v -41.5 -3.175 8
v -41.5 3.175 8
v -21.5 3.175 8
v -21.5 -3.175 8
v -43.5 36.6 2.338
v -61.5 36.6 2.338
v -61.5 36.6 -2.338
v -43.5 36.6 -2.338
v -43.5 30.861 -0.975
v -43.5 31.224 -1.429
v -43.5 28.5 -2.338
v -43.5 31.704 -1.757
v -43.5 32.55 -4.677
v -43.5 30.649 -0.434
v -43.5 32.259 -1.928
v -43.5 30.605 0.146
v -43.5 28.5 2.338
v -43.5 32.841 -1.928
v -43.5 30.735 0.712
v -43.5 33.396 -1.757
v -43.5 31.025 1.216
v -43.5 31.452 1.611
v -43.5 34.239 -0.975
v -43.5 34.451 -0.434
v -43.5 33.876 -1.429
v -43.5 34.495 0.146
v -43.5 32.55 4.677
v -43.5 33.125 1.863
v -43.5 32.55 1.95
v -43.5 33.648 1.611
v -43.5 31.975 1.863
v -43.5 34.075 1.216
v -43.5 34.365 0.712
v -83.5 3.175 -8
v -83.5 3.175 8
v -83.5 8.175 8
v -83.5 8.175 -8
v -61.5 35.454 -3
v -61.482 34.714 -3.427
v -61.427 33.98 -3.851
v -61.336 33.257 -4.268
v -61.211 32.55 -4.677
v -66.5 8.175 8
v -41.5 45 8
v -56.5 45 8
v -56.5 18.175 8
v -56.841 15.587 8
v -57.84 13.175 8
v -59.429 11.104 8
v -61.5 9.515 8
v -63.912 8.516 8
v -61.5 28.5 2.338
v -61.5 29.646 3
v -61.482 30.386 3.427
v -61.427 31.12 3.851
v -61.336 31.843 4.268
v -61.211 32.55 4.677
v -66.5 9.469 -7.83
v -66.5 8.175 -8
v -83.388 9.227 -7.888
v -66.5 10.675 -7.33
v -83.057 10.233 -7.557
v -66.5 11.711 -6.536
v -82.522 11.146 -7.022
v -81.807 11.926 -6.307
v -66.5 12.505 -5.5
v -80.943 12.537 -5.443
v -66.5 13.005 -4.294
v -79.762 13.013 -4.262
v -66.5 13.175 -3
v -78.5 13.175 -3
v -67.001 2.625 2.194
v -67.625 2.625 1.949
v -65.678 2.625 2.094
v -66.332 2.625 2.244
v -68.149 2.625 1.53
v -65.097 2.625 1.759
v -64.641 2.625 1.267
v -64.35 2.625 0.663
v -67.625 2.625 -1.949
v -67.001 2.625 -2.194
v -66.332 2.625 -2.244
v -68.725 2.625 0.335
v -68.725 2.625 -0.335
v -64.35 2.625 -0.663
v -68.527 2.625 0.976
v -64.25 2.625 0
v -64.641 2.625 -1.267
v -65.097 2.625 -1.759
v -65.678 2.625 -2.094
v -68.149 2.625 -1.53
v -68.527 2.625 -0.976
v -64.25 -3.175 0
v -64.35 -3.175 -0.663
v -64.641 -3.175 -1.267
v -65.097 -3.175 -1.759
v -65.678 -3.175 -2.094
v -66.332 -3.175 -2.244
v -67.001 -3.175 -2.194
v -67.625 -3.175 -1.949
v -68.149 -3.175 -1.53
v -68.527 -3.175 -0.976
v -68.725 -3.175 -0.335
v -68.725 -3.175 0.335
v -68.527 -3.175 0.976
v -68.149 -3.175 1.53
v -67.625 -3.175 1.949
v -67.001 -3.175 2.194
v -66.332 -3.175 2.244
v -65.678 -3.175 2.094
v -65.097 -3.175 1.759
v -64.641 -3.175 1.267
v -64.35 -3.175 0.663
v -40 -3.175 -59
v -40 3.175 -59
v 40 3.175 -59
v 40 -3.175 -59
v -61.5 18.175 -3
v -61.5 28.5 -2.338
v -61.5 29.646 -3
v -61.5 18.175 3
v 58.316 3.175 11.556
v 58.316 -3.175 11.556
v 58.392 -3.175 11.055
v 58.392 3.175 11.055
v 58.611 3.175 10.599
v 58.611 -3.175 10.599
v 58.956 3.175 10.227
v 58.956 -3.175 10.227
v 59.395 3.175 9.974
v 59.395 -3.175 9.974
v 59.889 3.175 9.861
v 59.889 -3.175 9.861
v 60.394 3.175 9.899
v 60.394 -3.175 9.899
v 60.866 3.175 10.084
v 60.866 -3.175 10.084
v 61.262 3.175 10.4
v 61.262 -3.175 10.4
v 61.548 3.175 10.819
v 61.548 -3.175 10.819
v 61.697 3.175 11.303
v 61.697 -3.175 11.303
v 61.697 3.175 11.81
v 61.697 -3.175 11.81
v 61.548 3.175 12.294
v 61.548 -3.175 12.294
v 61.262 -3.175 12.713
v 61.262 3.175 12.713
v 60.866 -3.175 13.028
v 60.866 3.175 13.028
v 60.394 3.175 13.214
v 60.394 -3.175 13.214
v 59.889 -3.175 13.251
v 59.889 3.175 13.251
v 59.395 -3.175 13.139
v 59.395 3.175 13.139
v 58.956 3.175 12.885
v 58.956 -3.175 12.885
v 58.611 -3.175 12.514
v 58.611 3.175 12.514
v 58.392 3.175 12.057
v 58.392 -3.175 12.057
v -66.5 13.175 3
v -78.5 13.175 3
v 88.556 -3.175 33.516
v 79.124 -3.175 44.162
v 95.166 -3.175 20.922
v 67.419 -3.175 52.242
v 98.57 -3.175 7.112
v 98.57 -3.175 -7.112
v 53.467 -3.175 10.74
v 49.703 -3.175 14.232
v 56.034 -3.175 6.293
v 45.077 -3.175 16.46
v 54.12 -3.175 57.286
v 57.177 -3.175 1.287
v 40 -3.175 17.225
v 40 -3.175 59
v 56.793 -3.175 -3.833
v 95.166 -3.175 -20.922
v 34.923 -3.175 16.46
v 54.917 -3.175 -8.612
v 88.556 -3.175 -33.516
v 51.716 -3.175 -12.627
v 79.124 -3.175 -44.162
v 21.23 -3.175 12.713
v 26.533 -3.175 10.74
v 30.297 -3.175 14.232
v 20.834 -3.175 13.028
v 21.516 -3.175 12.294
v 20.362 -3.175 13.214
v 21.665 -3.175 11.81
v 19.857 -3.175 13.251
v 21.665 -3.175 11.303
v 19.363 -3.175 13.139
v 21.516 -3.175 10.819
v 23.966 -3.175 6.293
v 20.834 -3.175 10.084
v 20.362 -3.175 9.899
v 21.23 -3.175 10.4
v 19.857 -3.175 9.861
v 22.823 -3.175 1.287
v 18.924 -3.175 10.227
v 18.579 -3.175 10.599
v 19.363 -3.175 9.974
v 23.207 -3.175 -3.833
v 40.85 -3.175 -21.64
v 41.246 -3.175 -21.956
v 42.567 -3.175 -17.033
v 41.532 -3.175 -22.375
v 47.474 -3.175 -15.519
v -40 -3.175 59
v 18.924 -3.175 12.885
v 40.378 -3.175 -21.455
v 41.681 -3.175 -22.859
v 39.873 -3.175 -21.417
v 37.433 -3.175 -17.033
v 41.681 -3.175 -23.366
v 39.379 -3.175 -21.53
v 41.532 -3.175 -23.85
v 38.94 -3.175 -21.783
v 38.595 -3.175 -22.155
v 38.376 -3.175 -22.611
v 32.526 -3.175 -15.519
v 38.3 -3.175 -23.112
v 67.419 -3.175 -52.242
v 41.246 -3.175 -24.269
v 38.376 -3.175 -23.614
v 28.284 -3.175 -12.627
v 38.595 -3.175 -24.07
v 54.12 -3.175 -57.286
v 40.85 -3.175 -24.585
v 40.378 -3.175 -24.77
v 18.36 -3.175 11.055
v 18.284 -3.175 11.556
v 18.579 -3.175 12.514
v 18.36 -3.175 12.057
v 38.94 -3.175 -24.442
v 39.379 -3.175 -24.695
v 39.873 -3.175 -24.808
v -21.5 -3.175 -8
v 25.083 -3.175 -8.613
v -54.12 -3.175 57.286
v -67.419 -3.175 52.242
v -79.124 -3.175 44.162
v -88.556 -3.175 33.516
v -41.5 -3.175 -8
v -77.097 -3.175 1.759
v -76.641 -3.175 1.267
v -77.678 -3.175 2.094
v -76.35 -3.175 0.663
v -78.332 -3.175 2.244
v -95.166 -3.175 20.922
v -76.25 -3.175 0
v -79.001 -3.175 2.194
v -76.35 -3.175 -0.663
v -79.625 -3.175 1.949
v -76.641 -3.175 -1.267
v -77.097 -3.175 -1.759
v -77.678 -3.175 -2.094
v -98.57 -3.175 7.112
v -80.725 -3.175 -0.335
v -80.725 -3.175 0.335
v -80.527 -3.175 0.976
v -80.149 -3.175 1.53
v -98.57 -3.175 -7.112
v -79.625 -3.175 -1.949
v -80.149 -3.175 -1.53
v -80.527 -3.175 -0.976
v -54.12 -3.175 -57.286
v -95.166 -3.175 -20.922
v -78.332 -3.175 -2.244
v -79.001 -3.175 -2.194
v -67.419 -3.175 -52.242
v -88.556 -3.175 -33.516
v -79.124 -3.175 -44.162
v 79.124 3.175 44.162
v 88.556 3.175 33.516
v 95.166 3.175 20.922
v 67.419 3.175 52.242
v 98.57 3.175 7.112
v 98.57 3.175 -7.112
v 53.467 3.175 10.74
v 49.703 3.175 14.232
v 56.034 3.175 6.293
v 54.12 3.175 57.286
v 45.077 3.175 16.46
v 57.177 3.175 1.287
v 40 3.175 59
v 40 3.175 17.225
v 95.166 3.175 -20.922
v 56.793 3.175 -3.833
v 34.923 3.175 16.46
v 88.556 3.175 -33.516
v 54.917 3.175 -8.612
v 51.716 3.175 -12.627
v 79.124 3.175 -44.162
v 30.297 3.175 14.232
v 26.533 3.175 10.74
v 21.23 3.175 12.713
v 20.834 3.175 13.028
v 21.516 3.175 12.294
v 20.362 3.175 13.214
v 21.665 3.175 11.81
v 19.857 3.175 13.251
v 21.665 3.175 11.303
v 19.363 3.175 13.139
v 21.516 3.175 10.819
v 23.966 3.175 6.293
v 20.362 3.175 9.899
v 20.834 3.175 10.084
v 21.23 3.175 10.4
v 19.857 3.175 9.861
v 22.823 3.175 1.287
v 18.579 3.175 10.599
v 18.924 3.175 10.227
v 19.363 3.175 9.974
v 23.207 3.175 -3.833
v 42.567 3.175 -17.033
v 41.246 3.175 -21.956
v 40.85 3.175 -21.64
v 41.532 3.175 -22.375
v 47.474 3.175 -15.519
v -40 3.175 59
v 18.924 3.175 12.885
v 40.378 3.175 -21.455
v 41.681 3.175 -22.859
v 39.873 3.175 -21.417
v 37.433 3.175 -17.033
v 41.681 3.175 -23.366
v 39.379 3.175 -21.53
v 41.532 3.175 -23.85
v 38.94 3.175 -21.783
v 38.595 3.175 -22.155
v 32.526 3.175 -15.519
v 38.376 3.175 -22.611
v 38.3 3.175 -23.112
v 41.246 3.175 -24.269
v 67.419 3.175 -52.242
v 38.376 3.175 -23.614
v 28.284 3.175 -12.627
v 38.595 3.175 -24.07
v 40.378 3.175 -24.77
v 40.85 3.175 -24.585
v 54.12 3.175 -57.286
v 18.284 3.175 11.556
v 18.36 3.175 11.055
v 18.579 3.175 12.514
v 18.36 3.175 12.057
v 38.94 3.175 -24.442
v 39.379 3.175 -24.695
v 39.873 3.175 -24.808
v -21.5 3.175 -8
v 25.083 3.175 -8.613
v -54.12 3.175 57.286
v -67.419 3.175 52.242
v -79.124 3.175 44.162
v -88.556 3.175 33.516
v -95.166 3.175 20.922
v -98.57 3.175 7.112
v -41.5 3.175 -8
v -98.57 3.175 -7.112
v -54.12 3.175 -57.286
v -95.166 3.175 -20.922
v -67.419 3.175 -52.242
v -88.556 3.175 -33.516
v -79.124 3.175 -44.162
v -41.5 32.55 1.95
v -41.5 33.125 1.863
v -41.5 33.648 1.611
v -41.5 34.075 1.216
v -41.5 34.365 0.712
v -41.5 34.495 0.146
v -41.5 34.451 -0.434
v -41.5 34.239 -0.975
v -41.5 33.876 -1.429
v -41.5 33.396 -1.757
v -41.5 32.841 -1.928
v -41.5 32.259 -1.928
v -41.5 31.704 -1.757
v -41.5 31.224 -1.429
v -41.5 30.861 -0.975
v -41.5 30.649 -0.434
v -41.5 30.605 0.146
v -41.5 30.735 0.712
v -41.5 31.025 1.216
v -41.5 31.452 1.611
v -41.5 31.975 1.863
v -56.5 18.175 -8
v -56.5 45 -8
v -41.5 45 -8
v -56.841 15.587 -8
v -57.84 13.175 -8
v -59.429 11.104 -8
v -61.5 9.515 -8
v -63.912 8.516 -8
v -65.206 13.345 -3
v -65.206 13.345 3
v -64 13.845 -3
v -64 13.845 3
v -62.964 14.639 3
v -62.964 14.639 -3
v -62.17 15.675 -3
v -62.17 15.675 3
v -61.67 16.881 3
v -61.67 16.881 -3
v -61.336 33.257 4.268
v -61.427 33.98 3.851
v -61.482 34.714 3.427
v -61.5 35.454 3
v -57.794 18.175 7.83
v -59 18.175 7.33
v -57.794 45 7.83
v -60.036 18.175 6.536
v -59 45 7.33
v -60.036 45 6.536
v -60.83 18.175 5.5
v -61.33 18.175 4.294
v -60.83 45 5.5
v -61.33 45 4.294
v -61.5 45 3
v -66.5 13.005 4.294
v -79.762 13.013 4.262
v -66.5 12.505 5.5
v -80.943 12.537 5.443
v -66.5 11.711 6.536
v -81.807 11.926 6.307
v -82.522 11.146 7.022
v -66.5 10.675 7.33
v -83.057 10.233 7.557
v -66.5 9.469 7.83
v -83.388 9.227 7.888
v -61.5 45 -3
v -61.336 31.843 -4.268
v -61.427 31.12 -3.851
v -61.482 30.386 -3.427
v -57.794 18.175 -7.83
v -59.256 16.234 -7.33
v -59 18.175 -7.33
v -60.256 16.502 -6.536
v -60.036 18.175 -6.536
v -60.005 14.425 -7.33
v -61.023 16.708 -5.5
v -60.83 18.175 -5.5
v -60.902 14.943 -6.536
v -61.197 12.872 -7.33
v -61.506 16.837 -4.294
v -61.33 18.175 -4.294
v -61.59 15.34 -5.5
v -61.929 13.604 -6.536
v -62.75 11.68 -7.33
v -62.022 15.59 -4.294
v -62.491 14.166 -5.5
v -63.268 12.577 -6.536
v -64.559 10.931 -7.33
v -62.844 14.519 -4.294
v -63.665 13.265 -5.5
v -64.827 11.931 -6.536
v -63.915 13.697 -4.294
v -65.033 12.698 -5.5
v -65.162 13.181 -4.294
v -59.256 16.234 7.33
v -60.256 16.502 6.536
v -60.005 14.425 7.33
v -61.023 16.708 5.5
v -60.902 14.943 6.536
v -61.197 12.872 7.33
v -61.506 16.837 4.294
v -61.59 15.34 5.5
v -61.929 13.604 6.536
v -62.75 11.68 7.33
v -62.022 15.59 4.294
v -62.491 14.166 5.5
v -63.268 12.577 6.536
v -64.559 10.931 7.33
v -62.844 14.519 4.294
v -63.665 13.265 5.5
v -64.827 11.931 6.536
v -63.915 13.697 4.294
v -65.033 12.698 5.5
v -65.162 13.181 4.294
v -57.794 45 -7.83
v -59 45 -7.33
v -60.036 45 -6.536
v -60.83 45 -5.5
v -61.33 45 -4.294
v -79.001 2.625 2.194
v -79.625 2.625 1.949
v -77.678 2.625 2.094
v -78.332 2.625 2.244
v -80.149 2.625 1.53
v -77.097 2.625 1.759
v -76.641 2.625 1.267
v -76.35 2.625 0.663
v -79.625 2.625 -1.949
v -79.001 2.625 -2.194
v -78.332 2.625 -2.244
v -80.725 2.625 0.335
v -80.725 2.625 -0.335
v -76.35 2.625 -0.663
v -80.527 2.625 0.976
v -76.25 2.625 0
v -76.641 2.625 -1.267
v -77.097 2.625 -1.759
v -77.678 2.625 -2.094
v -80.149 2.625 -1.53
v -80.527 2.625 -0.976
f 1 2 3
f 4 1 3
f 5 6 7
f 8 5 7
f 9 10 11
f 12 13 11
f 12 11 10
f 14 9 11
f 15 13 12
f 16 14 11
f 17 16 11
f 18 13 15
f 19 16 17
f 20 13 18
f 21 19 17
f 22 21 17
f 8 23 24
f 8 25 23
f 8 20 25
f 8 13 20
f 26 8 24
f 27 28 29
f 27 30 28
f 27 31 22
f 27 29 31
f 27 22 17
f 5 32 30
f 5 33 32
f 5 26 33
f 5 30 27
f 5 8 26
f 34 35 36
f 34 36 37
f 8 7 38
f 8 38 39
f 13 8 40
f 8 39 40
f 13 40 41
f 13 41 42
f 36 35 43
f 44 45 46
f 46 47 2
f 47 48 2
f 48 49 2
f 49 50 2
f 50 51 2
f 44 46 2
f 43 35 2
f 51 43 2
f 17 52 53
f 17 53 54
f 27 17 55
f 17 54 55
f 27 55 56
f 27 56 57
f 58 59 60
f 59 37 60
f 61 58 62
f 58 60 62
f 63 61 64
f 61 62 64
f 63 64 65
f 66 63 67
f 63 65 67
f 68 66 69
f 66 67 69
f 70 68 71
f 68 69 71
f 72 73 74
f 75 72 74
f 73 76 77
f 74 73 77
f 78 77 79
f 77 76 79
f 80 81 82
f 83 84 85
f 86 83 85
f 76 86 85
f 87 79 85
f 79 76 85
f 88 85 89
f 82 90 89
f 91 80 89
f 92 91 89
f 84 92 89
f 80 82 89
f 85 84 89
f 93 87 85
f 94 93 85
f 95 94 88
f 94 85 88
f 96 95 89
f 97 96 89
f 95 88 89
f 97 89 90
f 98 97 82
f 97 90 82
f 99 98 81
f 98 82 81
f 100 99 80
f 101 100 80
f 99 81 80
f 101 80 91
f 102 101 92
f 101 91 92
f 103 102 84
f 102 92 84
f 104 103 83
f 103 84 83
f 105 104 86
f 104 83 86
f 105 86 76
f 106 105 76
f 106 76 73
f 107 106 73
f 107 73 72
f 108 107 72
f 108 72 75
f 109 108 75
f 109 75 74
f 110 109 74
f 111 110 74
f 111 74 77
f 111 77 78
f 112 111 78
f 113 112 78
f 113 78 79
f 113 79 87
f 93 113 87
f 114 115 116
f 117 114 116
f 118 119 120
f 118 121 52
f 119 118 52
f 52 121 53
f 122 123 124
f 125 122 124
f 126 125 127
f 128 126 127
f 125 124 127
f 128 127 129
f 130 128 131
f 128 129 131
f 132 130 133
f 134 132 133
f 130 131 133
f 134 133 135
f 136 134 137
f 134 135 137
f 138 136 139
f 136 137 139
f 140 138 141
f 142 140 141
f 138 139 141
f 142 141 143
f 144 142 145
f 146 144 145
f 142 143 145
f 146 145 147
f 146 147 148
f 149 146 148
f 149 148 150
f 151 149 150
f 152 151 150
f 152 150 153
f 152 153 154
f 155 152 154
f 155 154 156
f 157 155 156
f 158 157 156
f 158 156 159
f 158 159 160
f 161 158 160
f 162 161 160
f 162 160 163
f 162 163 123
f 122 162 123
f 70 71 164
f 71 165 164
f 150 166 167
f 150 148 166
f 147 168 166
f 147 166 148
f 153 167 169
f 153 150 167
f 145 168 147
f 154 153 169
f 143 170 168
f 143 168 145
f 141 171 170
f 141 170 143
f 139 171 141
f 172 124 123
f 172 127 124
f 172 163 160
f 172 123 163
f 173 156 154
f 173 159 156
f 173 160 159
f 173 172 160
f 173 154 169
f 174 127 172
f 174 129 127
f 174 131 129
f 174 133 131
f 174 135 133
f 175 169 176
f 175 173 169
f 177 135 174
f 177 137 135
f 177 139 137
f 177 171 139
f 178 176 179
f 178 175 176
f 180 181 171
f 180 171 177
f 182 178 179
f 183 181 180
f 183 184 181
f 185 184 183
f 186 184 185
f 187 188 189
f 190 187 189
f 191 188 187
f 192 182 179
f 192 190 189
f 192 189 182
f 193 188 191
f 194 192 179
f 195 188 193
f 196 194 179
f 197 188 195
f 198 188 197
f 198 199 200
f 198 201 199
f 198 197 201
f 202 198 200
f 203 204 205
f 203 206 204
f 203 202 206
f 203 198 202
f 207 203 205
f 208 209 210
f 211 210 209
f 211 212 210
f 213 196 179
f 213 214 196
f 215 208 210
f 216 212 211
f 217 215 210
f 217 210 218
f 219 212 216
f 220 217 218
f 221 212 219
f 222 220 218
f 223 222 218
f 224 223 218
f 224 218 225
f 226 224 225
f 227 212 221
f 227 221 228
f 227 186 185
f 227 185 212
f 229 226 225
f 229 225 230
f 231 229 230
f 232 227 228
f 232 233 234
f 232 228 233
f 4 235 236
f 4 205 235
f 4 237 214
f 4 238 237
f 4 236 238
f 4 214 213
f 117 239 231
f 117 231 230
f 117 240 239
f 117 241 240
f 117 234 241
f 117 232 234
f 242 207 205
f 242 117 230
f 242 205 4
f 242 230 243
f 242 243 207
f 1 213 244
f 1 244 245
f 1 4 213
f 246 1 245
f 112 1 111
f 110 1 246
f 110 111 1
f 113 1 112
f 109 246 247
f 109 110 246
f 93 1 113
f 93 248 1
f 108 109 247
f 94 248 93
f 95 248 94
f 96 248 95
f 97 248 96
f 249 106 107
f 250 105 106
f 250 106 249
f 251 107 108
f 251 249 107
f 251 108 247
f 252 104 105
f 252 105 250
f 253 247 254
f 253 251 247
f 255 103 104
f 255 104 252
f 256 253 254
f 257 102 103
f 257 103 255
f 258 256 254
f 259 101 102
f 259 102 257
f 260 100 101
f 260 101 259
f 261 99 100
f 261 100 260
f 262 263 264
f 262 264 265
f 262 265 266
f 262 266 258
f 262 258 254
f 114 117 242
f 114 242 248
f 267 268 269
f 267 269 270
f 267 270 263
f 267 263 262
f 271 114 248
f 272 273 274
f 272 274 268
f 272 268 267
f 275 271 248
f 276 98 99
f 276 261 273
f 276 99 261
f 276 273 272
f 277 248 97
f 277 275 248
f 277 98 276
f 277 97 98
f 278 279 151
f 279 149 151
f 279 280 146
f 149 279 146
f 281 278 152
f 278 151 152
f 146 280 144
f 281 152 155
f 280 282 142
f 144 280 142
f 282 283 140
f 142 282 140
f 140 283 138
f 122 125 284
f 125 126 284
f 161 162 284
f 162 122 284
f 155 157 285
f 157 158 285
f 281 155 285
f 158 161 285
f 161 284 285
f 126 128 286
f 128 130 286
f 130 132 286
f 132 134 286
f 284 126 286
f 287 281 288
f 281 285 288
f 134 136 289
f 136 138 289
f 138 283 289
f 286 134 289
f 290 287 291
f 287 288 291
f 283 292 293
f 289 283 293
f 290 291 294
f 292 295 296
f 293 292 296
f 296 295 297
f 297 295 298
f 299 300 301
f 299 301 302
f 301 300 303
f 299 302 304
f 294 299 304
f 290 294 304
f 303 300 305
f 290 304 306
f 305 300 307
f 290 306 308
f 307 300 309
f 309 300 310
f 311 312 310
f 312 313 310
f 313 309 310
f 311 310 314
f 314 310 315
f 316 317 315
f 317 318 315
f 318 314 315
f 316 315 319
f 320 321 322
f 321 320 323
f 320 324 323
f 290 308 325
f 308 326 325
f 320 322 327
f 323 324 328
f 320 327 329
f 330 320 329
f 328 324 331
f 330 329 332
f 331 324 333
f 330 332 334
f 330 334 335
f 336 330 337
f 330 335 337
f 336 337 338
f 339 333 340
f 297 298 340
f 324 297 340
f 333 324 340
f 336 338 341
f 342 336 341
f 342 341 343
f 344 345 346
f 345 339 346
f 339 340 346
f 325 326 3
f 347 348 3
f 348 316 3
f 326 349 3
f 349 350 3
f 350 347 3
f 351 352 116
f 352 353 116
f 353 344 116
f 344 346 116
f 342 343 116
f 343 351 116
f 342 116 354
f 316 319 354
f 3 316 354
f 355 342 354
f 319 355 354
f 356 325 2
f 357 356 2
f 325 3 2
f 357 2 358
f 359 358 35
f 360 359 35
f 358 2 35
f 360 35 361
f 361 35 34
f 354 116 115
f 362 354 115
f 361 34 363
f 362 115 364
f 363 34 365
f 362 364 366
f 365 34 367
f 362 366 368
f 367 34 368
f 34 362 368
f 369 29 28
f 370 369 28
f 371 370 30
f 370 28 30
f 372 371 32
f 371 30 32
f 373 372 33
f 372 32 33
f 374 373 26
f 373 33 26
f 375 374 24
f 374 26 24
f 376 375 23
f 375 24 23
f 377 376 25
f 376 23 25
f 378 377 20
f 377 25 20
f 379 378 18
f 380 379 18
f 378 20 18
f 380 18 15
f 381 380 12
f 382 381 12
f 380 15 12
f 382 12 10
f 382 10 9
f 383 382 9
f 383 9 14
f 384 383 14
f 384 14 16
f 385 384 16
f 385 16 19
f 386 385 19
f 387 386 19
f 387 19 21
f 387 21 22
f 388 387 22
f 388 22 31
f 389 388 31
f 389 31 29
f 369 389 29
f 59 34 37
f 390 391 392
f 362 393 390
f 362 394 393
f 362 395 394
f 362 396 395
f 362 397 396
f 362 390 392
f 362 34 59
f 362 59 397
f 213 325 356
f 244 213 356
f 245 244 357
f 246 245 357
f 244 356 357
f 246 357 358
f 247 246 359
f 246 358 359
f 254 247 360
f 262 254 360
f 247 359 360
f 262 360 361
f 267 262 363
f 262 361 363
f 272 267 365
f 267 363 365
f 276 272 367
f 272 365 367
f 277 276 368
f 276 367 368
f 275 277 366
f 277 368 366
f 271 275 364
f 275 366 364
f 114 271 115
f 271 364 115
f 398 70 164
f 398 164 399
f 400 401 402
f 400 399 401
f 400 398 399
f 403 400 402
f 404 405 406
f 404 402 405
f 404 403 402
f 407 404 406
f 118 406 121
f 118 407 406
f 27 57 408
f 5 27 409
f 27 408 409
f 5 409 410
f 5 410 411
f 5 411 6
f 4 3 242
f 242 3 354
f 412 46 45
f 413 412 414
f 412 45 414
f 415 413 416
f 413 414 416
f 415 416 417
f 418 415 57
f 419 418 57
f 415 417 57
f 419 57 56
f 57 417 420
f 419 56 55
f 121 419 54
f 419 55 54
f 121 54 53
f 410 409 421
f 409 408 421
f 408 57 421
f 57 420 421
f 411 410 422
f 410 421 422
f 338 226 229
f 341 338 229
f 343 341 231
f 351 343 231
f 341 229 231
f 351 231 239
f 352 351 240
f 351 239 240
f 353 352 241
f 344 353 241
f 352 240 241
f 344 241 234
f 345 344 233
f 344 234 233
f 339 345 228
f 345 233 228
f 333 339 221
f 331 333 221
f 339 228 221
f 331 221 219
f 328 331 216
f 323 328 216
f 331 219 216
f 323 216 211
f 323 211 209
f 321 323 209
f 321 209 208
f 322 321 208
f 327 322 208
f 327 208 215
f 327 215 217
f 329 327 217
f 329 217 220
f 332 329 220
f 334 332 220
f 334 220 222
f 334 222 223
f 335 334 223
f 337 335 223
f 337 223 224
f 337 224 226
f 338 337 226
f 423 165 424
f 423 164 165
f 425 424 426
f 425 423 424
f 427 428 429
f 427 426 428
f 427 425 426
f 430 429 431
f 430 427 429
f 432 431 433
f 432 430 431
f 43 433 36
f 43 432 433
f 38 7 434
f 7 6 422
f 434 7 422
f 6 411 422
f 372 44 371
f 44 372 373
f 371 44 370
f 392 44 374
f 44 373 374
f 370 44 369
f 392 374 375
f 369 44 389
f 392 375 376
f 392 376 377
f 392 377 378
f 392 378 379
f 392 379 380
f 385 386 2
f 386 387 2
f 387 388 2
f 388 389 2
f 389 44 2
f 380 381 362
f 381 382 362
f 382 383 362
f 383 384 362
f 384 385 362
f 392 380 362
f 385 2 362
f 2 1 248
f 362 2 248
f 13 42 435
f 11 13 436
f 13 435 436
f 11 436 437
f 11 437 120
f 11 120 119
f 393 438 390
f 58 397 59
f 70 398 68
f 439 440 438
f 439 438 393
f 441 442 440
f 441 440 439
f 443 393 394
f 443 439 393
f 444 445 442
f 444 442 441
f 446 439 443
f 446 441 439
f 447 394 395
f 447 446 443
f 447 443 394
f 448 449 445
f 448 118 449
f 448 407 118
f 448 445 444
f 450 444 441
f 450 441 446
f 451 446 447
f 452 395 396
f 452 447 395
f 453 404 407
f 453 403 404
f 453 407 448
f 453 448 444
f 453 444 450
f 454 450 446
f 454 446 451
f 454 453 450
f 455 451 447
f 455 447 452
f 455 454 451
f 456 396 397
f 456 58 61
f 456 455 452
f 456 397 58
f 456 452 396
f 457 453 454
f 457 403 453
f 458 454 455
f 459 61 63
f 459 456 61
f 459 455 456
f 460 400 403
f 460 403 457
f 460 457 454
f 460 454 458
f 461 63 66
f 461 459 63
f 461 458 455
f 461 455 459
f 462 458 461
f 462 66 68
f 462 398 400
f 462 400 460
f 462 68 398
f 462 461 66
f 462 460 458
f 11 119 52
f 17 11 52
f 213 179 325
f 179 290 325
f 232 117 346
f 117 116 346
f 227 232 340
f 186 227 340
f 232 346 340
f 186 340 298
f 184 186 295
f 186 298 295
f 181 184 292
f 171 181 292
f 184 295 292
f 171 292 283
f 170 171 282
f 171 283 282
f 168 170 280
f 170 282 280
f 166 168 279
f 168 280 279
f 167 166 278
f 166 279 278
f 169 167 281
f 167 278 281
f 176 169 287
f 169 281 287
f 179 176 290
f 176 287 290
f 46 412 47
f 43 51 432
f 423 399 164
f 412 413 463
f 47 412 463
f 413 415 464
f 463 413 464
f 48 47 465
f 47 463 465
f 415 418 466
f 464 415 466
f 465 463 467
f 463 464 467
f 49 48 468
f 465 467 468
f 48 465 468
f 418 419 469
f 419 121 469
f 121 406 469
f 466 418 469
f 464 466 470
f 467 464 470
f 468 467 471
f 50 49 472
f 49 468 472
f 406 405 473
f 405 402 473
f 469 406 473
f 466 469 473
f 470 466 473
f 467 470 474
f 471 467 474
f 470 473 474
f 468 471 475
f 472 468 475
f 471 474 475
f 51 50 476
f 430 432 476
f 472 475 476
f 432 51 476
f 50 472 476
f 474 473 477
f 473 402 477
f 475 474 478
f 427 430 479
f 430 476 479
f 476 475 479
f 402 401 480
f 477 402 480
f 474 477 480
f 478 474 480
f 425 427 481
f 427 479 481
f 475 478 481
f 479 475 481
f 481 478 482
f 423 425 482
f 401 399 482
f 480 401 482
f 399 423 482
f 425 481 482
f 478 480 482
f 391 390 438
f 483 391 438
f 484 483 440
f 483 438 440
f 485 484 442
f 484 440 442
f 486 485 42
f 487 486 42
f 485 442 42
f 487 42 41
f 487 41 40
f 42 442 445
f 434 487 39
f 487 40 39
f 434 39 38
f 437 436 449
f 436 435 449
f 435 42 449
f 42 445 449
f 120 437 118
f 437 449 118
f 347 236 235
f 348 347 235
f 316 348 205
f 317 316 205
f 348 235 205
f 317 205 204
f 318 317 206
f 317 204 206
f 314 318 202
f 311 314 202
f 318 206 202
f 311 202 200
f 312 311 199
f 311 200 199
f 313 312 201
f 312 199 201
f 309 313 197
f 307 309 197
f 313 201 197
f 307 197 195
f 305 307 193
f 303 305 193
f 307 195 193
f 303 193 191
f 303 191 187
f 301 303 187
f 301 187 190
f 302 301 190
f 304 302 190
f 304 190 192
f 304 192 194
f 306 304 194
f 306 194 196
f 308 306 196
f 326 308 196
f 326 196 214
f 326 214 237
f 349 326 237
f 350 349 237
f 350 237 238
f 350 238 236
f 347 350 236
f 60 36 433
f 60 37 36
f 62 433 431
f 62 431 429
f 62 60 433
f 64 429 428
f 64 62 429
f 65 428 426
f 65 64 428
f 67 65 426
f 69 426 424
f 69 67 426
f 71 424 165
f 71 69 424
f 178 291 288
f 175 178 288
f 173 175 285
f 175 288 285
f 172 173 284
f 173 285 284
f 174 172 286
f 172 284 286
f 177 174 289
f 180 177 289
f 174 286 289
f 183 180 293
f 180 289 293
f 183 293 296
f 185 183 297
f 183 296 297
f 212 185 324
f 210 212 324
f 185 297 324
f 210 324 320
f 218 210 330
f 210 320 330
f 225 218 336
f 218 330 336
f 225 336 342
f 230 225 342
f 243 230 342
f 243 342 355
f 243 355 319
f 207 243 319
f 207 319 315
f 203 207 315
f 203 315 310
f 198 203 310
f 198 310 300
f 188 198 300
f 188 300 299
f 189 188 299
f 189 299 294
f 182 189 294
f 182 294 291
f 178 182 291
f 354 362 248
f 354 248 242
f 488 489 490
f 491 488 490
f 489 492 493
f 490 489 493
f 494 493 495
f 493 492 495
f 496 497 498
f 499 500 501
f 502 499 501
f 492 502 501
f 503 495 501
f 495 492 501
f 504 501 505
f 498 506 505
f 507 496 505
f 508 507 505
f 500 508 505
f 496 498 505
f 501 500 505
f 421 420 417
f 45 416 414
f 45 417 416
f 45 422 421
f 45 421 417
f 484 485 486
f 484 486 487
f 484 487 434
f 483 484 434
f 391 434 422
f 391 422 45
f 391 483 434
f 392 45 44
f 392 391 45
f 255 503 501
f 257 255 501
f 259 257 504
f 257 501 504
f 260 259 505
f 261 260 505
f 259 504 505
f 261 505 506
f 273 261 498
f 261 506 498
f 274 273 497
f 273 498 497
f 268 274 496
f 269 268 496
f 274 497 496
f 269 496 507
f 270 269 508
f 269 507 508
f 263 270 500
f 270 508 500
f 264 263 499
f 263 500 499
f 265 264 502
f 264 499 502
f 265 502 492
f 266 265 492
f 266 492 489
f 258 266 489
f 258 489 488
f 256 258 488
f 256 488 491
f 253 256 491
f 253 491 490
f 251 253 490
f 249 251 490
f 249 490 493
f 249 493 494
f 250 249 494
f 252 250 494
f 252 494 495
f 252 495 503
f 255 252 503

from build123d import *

# Parameters (mm, degrees)
BOSS_EXTRU_1_DEPTH                  = 3.175
ESQUISSE3_W                         = 42
ESQUISSE3_H                         = 16
BOSS_EXTRU_2_DEPTH                  = 45
ESQUISSE4_W                         = 20
ESQUISSE4_H                         = 16
ENL_V_MAT_EXTRU_1_DEPTH             = 123.60232716
ESQUISSE5_W                         = 22
ESQUISSE5_H                         = 31.825
ENL_V_MAT_EXTRU_2_DEPTH             = 128.730184373
CONG_1_R                            = 5
D_GAGEMENT_M3_51_D                  = 3.9
D_GAGEMENT_M31_D                    = 3.4
ESQUISSE11_R                        = 17.225
ENL_V_MAT_EXTRU_3_DEPTH             = 123.60232716
DIAM_TRE_DU_PER_AGE_4_5_4_5_2_D     = 4.5
DIAM_TRE_DU_PER_AGE_4_5_4_5_2_DEPTH = 5.8
ENL_V_MAT_EXTRU_4_DEPTH             = 18


with BuildPart() as part:
    # Esquisse1 → Boss.-Extru.1 (new, symmetric)
    with BuildSketch(Plane(origin=(0, 0, 0), x_dir=(1, 0, 0), z_dir=(0, 1, 0))):
        with BuildLine():
            Line((-40, 59), (40, 59))
            ThreePointArc((40, 59), (99, 0), (40, -59))
            Line((40, -59), (-40, -59))
            ThreePointArc((-40, -59), (-99, 0), (-40, 59))
        make_face()
    extrude(amount=BOSS_EXTRU_1_DEPTH, both=True)

    # Esquisse3 → Boss.-Extru.2 (add)
    with BuildSketch(Plane(origin=(0, 0, 0), x_dir=(1, 0, 0), z_dir=(0, 1, 0))):
        with Locations((-62.5, 0)):
            Rectangle(ESQUISSE3_W, ESQUISSE3_H)
    extrude(amount=BOSS_EXTRU_2_DEPTH)

    # Esquisse4 → Enlèv. mat.-Extru.1 (cut, through all)
    with BuildSketch(Plane(origin=(0, 3.175, 0), x_dir=(1, 0, 0), z_dir=(0, 1, 0))):
        with Locations((-31.5, 0)):
            Rectangle(ESQUISSE4_W, ESQUISSE4_H)
    extrude(amount=-ENL_V_MAT_EXTRU_1_DEPTH, mode=Mode.SUBTRACT)

    # Esquisse5 → Enlèv. mat.-Extru.2 (cut, through all)
    with BuildSketch(Plane.XY.offset(8)):
        with Locations((-72.5, 29.0875)):
            Rectangle(ESQUISSE5_W, ESQUISSE5_H)
    extrude(amount=-ENL_V_MAT_EXTRU_2_DEPTH, mode=Mode.SUBTRACT)

    # Congé1
    cong_1_edges = [part.edges().sort_by_distance(p)[0] for p in [
        (-72.5, 13.175, -8),
        (-61.5, 13.175, 0),
        (-83.5, 13.175, 0),
        (-61.5, 29.0875, 8),
        (-61.5, 29.0875, -8),
        (-72.5, 13.175, 8),
    ]]
    fillet(cong_1_edges, radius=CONG_1_R)

    # Dégagement M3.51 (through all)
    with Locations(Plane(origin=(-41.5, 0, 0), x_dir=(0, 0, -1), z_dir=(1, 0, 0))):
        with Locations((0, 32.55)):
            Hole(D_GAGEMENT_M3_51_D / 2)

    # Dégagement M31 (through all)
    with Locations(Plane(origin=(0, 3.175, 0), x_dir=(1, 0, 0), z_dir=(0, 1, 0))):
        with Locations((60.016012145, -11.55625), (40, 23.1125), (19.983987855, -11.55625)):
            Hole(D_GAGEMENT_M31_D / 2)

    # Esquisse11 → Enlèv. mat.-Extru.3 (cut, through all)
    with BuildSketch(Plane(origin=(0, 3.175, 0), x_dir=(1, 0, 0), z_dir=(0, 1, 0))):
        with Locations(Location((40, 0, 0), (0, 0, 270))):
            Circle(ESQUISSE11_R)
    extrude(amount=-ENL_V_MAT_EXTRU_3_DEPTH, mode=Mode.SUBTRACT)

    # Diamètre du perçage Ø4.5 (4.5)2
    with Locations(Plane(origin=(0, -3.175, 0), x_dir=(-1, 0, 0), z_dir=(0, -1, 0))):
        with Locations((78.5, 0), (66.5, 0)):
            Hole(DIAM_TRE_DU_PER_AGE_4_5_4_5_2_D / 2, depth=DIAM_TRE_DU_PER_AGE_4_5_4_5_2_DEPTH)

    # Esquisse14 → Enlèv. mat.-Extru.4 (cut)
    with BuildSketch(Plane.ZY.offset(61.5)):
        Polygon((4.67653718, 32.55), (2.33826859, 36.6), (-2.33826859, 36.6), (-4.67653718, 32.55), (-2.33826859, 28.5), (2.33826859, 28.5), align=None)
    extrude(amount=-ENL_V_MAT_EXTRU_4_DEPTH, mode=Mode.SUBTRACT)


solid = part.part
